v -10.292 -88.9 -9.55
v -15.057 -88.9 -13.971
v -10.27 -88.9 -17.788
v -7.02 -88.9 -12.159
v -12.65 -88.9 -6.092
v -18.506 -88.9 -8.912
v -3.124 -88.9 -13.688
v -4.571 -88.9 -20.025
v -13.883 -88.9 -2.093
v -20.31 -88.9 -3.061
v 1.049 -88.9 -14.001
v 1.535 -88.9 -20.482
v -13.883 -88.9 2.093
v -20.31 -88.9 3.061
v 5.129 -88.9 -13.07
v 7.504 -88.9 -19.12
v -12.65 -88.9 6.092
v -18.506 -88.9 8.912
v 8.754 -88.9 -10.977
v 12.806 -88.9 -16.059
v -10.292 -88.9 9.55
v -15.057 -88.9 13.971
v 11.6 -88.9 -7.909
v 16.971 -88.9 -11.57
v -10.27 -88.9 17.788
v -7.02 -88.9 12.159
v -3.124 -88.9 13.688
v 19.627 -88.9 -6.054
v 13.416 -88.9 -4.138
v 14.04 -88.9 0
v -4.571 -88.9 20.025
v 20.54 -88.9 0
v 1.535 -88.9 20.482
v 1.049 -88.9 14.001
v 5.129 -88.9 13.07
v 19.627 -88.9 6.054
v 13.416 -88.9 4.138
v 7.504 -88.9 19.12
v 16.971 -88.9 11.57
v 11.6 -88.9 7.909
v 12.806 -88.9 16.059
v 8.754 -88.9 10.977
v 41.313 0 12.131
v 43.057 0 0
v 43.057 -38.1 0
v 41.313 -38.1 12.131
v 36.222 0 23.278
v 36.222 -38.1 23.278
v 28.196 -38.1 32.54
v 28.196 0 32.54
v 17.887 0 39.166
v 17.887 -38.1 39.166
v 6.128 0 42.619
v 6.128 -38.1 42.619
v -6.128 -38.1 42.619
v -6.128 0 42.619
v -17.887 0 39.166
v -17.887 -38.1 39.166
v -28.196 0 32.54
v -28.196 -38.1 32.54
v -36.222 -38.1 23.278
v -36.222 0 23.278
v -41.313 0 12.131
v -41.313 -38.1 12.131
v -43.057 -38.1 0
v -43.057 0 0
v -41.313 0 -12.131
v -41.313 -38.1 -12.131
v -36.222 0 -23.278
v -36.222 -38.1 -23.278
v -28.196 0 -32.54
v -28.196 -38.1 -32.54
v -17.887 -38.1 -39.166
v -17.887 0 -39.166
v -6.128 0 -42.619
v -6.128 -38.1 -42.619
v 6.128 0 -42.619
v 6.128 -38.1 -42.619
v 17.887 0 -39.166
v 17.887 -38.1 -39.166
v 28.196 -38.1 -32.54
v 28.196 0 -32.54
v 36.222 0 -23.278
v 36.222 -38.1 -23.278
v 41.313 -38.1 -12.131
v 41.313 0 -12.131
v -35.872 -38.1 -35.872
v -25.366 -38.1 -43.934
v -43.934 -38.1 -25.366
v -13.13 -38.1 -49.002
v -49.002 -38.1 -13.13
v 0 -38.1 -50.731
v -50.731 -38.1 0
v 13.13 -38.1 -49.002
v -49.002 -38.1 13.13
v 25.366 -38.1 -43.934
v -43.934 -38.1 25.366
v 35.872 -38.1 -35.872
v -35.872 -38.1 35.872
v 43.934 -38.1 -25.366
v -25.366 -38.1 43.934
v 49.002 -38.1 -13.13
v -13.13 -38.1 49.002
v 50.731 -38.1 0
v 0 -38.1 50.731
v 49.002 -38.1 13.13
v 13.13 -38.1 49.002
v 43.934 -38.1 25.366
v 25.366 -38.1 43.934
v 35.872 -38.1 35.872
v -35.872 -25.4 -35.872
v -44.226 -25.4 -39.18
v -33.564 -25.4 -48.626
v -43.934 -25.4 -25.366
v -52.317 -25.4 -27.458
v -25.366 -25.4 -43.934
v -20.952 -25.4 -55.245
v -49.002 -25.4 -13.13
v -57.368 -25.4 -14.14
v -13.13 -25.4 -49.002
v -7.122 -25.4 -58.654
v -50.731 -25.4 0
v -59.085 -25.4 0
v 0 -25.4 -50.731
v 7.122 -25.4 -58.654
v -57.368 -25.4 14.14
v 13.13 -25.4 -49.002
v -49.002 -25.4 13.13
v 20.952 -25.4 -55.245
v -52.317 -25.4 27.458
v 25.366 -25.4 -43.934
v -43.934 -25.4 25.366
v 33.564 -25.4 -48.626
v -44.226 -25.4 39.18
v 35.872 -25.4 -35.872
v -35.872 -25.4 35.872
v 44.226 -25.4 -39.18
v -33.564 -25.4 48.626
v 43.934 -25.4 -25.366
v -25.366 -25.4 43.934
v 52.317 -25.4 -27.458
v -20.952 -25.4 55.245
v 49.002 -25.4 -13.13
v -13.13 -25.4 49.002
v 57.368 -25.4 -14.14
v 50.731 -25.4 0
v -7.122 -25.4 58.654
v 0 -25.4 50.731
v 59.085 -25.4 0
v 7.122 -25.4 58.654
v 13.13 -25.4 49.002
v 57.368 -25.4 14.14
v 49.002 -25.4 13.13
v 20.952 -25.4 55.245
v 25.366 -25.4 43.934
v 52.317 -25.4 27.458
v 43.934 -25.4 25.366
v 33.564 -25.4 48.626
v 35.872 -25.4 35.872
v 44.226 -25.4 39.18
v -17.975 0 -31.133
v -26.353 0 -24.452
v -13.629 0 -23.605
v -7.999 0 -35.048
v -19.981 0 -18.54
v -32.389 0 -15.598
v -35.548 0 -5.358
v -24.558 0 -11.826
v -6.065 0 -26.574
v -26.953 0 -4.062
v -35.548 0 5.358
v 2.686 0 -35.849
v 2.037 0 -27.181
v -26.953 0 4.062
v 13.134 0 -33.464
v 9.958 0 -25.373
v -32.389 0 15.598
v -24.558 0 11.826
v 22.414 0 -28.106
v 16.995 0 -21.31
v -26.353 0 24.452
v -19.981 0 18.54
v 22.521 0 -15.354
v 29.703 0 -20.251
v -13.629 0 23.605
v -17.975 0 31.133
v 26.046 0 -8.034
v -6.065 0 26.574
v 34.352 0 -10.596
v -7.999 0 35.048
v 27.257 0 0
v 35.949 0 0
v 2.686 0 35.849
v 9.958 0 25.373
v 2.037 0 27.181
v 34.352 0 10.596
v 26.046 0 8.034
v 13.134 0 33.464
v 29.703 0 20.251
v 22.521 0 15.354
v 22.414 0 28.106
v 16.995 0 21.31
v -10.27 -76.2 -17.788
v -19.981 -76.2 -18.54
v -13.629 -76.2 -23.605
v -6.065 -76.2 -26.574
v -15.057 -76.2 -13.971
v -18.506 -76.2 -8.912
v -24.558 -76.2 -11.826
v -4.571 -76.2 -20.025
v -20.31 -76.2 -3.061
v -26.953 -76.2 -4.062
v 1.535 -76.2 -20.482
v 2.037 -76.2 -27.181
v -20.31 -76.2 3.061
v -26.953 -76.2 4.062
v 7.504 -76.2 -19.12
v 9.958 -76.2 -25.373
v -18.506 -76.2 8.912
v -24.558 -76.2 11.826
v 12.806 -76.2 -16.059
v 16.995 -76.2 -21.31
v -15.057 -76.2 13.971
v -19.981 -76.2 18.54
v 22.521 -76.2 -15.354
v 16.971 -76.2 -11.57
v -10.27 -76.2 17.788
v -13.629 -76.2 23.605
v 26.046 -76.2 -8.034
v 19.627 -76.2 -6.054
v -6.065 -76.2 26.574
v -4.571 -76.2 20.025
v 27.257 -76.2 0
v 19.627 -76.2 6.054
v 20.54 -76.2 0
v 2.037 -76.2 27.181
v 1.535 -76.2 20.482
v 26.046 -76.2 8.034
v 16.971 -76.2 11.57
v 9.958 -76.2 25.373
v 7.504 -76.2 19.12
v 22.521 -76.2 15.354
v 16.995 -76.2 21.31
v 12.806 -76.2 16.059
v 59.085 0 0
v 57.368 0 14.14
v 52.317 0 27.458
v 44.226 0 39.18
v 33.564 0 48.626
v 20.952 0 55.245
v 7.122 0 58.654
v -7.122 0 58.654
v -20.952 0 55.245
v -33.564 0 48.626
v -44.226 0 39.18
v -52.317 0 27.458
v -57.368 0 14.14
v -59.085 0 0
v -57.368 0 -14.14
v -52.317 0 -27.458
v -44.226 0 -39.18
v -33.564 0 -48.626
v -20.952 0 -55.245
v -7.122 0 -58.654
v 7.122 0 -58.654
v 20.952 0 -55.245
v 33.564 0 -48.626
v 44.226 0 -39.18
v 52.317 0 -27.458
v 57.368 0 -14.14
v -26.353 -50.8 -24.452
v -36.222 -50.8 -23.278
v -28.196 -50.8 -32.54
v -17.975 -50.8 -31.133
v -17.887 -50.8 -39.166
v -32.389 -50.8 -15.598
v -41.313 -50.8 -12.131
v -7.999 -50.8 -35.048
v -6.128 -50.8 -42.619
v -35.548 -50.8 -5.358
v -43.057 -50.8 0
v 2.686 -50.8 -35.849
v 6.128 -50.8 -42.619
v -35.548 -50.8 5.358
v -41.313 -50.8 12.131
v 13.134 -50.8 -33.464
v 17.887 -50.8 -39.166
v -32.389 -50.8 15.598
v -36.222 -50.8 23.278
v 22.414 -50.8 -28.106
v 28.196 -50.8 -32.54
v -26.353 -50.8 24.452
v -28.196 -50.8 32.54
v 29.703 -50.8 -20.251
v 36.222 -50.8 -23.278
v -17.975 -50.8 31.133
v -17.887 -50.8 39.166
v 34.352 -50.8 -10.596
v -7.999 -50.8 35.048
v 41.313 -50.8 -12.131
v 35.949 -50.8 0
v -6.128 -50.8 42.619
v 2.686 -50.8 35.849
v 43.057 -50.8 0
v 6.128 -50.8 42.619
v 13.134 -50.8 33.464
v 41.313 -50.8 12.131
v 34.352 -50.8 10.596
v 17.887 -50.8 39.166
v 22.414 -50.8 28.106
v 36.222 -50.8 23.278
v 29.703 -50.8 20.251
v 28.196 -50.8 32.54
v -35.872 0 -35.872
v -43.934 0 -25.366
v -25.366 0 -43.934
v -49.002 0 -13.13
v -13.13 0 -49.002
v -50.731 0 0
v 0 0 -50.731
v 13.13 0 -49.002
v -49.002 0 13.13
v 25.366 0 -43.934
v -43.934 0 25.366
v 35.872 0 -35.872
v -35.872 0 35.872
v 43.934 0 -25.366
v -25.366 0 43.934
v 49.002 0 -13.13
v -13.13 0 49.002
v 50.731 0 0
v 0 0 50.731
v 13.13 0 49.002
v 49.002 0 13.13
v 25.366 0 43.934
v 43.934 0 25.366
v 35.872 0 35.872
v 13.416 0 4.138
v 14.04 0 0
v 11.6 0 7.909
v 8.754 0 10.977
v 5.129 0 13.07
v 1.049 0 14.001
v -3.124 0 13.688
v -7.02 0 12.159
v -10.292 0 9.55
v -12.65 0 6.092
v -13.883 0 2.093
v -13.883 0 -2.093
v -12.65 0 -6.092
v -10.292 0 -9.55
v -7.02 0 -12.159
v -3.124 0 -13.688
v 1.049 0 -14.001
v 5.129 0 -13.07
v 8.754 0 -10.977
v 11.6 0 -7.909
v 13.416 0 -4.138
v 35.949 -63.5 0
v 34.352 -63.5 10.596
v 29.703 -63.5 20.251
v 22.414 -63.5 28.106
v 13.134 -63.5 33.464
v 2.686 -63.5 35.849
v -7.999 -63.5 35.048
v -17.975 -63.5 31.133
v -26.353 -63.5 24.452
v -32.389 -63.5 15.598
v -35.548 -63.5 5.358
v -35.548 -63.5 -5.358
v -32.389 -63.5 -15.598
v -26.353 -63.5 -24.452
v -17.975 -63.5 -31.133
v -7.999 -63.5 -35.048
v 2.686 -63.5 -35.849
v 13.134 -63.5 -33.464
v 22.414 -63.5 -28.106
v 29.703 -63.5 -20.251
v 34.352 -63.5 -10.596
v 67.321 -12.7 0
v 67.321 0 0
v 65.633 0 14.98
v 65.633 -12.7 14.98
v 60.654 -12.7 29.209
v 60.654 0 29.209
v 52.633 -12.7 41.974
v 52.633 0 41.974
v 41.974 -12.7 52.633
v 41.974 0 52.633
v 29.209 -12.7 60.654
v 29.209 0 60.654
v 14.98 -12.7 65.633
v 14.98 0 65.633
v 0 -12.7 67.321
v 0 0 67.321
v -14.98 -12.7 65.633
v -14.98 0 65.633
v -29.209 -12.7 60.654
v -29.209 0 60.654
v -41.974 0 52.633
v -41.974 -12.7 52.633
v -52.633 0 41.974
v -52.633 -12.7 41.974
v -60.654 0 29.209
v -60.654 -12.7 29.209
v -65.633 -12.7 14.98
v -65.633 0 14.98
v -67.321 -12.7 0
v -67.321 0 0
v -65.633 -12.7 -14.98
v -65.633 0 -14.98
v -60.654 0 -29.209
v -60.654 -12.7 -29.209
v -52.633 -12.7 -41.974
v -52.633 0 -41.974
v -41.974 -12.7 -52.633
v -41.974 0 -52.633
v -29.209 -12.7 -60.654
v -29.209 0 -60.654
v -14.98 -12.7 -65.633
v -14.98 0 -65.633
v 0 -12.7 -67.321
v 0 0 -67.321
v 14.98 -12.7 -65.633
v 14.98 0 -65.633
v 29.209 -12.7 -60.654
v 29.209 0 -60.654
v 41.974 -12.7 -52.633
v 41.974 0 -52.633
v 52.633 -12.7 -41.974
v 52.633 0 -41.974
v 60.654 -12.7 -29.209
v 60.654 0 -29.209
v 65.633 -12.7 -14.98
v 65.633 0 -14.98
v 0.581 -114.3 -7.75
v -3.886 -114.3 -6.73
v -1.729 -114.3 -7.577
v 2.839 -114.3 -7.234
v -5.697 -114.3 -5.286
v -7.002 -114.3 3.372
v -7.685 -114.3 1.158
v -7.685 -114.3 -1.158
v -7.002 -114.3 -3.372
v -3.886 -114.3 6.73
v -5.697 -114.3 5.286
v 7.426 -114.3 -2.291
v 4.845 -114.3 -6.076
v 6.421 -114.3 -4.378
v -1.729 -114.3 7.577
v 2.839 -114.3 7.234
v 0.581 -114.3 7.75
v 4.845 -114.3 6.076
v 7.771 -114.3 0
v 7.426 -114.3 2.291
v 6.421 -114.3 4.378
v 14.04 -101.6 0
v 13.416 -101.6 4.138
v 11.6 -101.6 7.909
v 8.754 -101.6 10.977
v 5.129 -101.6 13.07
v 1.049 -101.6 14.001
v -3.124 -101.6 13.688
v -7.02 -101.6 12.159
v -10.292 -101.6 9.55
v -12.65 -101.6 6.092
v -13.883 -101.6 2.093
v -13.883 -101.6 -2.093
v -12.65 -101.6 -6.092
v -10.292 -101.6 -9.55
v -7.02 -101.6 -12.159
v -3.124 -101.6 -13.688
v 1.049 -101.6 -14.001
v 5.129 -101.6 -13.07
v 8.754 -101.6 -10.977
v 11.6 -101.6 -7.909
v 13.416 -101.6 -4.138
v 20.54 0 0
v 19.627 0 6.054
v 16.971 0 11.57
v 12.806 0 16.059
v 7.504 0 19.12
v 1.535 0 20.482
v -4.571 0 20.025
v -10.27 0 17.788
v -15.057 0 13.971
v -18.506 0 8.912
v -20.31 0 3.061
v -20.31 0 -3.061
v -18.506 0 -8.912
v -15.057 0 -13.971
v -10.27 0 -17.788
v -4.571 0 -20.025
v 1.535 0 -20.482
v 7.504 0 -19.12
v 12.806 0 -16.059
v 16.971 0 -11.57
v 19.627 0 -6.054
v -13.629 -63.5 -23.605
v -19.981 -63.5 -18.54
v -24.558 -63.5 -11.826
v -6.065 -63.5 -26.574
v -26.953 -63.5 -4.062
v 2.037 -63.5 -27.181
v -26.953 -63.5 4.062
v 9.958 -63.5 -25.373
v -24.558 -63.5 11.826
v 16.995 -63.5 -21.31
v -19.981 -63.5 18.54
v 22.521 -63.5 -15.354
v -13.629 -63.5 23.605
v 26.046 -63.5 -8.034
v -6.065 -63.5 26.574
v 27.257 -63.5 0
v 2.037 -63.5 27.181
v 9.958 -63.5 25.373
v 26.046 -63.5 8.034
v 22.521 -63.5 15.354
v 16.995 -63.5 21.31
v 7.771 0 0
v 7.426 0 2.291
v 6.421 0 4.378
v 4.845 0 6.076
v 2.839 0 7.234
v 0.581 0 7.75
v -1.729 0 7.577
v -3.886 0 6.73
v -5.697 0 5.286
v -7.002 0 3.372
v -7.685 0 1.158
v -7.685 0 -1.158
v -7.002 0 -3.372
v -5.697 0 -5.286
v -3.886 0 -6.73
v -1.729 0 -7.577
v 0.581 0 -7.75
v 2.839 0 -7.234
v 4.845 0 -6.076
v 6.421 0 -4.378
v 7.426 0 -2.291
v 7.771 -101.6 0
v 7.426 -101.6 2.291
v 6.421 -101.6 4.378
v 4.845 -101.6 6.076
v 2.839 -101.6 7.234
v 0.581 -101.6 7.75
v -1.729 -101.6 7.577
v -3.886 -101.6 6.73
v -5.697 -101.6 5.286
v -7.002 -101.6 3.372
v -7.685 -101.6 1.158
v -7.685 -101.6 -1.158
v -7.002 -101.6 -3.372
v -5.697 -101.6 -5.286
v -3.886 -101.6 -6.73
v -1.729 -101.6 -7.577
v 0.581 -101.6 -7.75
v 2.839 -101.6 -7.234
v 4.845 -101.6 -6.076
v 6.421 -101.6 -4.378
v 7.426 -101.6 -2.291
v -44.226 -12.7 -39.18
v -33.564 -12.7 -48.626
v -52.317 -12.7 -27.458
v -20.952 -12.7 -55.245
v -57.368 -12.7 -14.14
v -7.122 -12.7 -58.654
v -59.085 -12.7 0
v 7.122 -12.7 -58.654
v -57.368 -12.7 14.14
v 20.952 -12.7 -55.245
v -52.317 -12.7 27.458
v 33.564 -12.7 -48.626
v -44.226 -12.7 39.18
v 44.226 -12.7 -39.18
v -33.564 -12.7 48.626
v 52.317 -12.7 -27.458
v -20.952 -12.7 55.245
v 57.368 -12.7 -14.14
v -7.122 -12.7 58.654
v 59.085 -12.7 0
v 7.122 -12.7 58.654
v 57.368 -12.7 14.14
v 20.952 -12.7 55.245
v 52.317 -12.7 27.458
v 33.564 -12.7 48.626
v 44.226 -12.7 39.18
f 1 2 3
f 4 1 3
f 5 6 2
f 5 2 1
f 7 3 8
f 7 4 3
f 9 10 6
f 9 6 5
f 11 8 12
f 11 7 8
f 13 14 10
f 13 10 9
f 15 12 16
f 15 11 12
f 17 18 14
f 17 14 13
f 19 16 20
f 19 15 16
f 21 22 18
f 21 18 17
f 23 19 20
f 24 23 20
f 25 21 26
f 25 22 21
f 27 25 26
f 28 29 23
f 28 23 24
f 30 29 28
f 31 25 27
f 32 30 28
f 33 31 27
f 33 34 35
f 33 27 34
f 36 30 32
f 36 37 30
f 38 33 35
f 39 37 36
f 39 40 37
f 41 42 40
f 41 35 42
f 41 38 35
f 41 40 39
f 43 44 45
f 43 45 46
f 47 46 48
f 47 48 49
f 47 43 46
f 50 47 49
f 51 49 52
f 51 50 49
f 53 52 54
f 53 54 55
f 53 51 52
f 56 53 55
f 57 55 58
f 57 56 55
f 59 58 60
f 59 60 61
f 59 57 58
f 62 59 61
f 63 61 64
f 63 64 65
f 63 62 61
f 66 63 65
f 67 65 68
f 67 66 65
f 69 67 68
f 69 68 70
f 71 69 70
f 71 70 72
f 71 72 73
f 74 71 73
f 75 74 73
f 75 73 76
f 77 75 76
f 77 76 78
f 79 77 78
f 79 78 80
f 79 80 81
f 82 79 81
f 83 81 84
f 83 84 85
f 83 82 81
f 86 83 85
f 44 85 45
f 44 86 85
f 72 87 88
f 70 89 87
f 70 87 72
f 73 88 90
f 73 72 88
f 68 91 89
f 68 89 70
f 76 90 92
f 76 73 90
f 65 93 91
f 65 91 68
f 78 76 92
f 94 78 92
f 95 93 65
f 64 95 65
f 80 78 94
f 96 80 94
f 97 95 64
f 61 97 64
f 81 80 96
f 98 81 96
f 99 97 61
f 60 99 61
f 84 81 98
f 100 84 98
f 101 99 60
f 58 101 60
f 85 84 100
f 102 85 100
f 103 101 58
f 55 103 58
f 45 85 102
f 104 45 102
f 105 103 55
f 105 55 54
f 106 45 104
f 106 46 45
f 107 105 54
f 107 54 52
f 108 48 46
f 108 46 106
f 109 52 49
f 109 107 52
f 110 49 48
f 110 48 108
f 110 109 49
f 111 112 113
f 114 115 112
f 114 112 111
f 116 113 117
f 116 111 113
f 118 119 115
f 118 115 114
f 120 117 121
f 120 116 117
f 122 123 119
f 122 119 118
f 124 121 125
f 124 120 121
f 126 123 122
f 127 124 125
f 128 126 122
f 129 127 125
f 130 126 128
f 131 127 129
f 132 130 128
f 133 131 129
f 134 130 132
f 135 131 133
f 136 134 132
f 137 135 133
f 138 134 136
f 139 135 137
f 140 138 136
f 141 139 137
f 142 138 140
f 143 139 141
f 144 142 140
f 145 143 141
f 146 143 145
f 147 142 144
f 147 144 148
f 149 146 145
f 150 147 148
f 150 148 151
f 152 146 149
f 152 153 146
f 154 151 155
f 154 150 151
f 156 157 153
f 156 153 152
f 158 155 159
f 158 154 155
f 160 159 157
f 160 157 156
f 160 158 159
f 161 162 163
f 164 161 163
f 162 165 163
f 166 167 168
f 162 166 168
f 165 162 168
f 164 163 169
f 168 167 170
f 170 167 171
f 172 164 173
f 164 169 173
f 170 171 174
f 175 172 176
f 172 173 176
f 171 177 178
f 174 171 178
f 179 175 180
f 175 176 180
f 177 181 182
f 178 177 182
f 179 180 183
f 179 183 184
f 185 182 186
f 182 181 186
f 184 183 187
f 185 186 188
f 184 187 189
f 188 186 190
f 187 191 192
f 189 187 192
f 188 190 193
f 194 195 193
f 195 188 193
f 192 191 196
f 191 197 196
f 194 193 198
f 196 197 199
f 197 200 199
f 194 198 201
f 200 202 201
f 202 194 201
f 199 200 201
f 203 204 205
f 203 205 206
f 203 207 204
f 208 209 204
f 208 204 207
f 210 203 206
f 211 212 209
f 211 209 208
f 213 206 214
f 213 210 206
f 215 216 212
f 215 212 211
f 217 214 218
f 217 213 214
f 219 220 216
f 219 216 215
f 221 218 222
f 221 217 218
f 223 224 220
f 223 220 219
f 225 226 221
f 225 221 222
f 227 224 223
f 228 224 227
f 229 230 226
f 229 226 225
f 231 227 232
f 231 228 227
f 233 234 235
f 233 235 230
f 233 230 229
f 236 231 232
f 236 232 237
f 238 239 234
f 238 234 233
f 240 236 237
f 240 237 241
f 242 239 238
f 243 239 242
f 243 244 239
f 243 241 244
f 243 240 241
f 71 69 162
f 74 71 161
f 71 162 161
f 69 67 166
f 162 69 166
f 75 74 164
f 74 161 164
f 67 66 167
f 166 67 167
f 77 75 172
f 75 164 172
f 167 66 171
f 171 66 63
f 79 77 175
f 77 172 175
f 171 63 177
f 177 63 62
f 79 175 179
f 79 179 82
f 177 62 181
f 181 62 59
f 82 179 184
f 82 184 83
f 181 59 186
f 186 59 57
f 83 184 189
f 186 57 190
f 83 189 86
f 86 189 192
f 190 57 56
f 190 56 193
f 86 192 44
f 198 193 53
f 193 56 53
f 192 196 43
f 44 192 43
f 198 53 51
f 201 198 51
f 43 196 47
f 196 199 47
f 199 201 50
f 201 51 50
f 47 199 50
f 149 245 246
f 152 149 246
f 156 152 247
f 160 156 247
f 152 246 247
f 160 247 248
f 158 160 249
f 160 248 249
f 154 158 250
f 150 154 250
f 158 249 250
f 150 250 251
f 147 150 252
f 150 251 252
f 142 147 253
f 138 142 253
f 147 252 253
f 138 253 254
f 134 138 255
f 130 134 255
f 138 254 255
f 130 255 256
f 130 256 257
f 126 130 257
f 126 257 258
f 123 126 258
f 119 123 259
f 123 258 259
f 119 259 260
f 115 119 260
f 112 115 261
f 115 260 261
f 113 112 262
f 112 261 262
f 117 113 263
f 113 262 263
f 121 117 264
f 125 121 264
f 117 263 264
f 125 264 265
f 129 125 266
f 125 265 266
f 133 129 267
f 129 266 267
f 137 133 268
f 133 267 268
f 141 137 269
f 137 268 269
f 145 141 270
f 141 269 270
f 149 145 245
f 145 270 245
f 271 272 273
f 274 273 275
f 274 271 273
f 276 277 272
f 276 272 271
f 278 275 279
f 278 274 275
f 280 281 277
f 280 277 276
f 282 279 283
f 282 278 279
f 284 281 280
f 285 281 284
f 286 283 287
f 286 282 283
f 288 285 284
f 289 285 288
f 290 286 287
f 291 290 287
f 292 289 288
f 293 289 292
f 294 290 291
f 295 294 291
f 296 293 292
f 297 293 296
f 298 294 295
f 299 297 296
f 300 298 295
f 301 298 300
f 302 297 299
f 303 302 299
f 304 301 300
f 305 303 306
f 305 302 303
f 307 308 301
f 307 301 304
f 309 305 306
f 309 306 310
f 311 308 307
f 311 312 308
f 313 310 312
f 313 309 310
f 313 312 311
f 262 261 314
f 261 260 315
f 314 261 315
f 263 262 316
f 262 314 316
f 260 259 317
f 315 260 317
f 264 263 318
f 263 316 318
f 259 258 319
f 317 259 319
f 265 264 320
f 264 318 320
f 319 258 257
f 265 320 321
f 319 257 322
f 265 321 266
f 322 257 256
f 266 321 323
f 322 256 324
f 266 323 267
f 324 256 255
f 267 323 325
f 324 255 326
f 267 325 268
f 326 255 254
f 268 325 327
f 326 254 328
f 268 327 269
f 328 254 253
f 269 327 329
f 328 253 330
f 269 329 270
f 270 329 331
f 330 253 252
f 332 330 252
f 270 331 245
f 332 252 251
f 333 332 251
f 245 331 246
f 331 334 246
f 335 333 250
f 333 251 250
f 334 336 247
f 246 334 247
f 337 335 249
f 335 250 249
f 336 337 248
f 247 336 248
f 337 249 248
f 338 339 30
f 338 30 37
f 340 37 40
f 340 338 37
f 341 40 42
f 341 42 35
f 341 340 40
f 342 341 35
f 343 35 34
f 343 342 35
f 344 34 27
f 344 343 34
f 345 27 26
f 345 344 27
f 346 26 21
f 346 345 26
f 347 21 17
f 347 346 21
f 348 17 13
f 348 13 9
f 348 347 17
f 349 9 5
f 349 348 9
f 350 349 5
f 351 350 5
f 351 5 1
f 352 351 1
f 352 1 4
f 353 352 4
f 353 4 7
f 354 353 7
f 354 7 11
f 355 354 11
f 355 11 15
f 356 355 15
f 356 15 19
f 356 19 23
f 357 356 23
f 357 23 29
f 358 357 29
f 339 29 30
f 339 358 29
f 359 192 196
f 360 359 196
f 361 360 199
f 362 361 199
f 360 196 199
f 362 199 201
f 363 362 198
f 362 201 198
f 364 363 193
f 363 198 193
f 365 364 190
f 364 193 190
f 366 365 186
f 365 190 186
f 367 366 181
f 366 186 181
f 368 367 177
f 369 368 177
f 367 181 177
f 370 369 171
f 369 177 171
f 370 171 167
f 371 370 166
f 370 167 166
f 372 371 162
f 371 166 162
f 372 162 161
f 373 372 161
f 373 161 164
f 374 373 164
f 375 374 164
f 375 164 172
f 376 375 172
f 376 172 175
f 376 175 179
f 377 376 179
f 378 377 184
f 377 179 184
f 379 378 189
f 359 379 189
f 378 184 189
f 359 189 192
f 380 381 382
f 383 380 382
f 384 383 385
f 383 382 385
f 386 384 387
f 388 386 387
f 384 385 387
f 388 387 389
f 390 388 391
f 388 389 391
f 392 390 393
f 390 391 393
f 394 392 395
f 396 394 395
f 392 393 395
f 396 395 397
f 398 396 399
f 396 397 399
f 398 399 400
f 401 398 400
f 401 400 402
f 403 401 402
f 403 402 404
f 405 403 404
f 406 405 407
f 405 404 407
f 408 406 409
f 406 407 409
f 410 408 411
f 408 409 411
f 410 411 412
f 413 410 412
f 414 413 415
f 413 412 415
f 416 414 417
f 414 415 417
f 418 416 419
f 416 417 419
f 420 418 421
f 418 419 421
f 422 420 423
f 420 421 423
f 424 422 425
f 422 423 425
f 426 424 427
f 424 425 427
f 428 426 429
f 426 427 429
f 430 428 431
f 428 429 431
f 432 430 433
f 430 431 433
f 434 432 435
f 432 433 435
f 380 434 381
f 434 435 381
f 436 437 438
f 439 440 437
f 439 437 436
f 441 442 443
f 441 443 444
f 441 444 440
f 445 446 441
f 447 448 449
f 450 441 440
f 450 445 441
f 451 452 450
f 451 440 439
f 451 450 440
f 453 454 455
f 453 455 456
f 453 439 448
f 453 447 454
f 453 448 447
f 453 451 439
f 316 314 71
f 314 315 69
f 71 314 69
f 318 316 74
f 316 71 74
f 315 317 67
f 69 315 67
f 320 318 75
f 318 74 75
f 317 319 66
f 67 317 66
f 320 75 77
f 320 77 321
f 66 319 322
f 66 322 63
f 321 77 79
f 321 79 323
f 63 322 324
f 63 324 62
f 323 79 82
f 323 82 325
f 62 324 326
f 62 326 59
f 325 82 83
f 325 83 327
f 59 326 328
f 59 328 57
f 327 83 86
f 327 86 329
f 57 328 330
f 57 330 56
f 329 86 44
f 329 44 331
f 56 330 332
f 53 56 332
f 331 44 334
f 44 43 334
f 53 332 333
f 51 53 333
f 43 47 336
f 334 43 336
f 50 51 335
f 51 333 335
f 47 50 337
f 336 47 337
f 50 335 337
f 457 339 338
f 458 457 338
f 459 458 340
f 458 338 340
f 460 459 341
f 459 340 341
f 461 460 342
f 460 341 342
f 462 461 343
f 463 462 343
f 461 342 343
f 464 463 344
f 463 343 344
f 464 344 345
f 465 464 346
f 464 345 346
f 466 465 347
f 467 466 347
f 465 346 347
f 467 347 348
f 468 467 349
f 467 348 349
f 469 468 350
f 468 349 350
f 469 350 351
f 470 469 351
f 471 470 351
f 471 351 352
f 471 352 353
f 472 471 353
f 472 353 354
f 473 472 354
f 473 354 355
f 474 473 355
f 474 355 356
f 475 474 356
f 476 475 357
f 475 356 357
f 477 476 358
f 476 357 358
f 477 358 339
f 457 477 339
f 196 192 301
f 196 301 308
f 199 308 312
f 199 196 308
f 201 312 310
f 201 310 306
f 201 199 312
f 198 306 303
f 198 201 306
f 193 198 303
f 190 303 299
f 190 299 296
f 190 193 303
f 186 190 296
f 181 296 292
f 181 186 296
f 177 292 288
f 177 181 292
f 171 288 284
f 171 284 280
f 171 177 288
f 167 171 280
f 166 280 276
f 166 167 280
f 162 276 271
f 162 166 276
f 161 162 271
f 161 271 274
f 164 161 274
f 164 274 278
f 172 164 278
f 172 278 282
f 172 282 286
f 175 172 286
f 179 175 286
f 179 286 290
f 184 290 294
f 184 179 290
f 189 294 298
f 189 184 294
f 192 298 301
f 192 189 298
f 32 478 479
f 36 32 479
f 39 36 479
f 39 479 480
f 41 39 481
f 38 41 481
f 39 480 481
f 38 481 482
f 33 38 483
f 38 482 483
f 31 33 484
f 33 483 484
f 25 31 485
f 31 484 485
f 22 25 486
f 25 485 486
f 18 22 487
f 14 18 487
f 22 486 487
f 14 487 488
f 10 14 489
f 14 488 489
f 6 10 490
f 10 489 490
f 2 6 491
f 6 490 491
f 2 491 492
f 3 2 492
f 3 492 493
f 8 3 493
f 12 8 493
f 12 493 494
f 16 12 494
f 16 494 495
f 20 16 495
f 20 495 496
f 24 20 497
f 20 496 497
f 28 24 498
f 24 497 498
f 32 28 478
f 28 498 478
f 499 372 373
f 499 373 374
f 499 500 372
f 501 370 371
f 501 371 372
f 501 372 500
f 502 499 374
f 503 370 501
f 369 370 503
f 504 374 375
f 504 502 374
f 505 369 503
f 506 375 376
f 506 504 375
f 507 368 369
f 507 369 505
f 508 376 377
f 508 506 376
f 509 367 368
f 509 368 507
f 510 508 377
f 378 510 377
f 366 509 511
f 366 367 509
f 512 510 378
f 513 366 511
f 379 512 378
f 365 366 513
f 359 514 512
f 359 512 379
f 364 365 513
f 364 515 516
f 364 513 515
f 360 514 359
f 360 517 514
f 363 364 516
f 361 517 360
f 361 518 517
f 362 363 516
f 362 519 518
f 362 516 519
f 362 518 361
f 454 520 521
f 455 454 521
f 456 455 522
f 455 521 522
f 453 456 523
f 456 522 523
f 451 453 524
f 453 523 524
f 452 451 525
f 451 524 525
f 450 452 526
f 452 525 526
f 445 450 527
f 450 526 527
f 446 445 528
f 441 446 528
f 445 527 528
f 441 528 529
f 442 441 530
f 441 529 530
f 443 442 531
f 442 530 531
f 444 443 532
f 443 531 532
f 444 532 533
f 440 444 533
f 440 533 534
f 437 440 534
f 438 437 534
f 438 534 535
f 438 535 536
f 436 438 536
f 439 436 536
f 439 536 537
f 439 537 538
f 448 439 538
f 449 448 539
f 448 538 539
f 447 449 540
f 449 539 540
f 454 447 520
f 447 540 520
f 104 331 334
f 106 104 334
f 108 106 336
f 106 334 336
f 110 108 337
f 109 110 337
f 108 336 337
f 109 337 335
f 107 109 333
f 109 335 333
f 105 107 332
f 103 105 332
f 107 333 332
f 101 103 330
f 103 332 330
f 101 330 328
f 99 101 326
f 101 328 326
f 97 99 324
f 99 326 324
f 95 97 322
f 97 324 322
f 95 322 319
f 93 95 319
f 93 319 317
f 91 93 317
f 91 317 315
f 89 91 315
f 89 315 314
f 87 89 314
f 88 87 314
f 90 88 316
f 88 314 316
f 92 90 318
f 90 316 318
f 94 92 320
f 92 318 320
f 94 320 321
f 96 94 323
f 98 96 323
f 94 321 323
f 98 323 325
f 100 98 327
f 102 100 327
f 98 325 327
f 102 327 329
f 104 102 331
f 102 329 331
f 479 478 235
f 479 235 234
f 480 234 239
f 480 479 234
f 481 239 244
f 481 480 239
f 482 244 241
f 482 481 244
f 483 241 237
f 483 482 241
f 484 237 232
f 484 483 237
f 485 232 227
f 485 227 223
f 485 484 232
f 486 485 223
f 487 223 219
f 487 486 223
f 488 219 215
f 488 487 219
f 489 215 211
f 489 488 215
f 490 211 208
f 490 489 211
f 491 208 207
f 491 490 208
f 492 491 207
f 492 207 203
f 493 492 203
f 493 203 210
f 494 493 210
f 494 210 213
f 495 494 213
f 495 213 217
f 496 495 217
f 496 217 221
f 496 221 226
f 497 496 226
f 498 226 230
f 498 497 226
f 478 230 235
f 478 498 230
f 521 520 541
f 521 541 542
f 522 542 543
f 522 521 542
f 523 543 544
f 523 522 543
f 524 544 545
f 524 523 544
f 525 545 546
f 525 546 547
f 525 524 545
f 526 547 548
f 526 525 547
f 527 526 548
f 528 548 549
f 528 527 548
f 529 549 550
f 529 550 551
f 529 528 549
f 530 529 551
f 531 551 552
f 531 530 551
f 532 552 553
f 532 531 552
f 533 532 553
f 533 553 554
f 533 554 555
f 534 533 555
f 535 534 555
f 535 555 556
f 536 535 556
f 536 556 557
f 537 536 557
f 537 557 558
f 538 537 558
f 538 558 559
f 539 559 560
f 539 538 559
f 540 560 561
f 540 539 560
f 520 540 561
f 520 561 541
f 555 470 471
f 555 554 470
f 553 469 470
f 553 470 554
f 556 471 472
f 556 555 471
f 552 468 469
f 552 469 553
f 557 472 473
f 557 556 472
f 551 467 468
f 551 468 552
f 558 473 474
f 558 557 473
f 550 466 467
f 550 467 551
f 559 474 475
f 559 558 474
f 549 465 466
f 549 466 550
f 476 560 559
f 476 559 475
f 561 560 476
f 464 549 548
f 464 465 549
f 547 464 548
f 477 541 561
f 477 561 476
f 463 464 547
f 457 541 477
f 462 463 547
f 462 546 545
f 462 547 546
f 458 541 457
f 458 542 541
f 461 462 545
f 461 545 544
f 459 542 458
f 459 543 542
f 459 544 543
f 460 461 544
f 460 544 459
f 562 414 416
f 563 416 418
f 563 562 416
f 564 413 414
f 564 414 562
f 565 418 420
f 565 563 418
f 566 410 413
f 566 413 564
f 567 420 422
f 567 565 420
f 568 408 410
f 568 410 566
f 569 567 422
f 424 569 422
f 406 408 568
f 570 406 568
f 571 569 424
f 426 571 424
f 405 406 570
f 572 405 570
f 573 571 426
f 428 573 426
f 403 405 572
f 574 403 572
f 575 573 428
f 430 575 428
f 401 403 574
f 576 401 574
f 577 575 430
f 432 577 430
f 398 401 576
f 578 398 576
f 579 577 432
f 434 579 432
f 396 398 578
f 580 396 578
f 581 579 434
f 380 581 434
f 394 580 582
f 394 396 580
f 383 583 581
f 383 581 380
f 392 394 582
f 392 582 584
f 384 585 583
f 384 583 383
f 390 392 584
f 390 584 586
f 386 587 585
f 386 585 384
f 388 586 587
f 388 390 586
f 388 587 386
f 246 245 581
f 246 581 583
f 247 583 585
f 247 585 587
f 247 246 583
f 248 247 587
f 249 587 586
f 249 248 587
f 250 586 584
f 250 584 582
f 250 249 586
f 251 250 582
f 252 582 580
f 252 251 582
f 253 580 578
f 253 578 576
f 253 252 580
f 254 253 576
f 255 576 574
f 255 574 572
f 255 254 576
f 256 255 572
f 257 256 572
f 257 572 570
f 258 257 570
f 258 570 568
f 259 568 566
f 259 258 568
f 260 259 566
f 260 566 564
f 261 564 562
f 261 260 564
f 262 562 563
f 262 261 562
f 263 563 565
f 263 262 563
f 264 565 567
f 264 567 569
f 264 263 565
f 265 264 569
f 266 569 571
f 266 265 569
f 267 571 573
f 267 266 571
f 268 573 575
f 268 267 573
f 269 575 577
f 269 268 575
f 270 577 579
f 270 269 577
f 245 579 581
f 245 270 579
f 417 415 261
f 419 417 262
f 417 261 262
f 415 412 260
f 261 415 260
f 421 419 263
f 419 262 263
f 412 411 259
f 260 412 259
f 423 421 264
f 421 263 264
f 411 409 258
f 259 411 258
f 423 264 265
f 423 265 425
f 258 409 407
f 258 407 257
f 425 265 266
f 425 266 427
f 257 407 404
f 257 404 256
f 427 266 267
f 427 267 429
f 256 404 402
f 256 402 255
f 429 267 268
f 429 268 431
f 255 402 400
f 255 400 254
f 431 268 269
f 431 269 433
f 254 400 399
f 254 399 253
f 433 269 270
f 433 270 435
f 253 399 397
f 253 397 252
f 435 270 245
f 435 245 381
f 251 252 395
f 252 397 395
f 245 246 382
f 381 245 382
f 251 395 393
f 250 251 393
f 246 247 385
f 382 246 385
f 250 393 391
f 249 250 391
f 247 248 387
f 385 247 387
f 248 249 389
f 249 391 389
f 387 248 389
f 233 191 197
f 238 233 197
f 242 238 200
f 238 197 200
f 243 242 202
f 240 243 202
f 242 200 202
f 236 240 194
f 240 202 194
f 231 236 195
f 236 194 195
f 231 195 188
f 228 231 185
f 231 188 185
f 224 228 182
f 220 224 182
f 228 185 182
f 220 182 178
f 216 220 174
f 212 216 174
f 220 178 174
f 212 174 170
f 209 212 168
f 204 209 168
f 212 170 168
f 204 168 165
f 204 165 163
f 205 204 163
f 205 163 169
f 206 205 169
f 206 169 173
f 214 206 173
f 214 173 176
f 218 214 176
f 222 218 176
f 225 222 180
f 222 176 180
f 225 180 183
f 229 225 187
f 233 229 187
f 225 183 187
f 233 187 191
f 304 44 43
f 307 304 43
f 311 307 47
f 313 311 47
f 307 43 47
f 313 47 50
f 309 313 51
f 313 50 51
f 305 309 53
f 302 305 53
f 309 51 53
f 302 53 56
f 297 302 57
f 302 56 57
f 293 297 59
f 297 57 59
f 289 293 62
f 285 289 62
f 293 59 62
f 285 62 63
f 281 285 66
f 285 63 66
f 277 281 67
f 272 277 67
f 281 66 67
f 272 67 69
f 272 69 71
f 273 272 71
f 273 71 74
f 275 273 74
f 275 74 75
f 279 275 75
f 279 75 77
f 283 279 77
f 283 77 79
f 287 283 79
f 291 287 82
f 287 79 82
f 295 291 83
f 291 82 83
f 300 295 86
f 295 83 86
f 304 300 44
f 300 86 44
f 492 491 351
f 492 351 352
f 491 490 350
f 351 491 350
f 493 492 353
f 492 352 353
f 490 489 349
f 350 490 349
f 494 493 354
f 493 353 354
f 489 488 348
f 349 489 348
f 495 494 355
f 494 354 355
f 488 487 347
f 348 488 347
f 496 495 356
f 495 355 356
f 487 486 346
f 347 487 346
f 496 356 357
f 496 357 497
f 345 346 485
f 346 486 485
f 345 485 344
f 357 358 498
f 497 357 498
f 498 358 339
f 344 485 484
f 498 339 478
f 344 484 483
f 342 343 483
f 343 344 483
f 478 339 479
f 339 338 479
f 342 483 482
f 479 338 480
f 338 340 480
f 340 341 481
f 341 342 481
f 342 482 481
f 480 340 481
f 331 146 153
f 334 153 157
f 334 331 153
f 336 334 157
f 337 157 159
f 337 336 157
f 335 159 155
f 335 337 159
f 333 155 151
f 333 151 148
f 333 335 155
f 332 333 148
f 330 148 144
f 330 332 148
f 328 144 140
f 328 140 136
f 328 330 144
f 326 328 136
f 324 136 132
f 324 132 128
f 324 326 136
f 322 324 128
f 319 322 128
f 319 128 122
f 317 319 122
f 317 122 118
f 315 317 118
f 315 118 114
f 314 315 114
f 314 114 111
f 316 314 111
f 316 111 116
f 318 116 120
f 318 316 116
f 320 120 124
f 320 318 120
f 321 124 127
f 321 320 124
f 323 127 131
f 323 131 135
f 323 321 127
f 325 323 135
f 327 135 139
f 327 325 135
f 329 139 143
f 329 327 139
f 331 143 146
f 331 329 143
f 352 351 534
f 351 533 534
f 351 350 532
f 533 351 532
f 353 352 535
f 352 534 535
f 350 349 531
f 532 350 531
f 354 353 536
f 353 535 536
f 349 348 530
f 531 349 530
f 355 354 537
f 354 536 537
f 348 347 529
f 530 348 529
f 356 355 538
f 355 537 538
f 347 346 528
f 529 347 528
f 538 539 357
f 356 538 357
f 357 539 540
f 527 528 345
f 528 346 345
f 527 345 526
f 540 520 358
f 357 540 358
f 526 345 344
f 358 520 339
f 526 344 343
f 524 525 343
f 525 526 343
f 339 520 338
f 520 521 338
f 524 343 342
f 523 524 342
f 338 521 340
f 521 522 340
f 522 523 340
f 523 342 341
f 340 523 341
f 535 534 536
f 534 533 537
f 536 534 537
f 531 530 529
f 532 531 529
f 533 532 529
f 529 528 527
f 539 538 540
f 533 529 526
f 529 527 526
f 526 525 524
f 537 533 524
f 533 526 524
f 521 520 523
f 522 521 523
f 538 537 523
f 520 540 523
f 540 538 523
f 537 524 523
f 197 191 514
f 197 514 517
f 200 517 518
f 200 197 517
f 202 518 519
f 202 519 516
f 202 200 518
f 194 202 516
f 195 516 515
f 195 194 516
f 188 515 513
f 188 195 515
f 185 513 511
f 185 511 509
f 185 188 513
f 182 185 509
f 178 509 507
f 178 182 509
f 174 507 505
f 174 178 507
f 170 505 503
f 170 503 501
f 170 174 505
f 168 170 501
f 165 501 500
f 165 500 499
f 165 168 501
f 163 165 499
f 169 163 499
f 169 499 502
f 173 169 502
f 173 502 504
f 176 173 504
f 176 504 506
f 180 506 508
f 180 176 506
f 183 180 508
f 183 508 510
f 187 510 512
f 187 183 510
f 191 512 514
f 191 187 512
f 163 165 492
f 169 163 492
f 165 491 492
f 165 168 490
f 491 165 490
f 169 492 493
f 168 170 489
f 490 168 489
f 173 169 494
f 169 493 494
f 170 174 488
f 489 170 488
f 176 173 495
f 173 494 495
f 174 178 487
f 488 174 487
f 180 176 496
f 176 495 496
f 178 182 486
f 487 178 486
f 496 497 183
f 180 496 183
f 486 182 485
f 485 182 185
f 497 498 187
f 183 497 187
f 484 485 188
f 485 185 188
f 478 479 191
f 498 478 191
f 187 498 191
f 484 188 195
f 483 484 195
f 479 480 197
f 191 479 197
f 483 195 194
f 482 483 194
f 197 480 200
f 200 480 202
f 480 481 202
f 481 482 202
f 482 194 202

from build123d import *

# Parameters (mm, degrees)
F0_R     = 67.320572
F0_R_2   = 59.084794
F1_DEPTH = 12.7
F0_R_3   = 50.731089
F2_DEPTH = 25.4
F0_R_4   = 43.057022
F3_DEPTH = 38.1
F0_R_5   = 35.949193
F4_DEPTH = 50.8
F0_R_6   = 27.257099
F5_DEPTH = 63.5
F0_R_7   = 20.539643
F6_DEPTH = 76.2
F0_R_8   = 14.040046
F7_DEPTH = 88.9
F0_R_9   = 7.771382
F8_DEPTH = 101.6
F9_DEPTH = 114.3


with BuildPart() as f1:
    # F0 (on Front) → F1 (new body)
    with BuildSketch(Plane.XZ):
        Circle(F0_R)
        Circle(F0_R_2, mode=Mode.SUBTRACT)
    extrude(amount=F1_DEPTH)


with BuildPart() as f2:
    # F0 (on Front) → F2 (new body)
    with BuildSketch(Plane.XZ):
        Circle(F0_R_2)
        Circle(F0_R_3, mode=Mode.SUBTRACT)
    extrude(amount=F2_DEPTH)


with BuildPart() as f3:
    # F0 (on Front) → F3 (new body)
    with BuildSketch(Plane.XZ):
        Circle(F0_R_3)
        Circle(F0_R_4, mode=Mode.SUBTRACT)
    extrude(amount=F3_DEPTH)


with BuildPart() as f4:
    # F0 (on Front) → F4 (new body)
    with BuildSketch(Plane.XZ):
        Circle(F0_R_4)
        Circle(F0_R_5, mode=Mode.SUBTRACT)
    extrude(amount=F4_DEPTH)


with BuildPart() as f5:
    # F0 (on Front) → F5 (new body)
    with BuildSketch(Plane.XZ):
        Circle(F0_R_5)
        Circle(F0_R_6, mode=Mode.SUBTRACT)
    extrude(amount=F5_DEPTH)


with BuildPart() as f6:
    # F0 (on Front) → F6 (new body)
    with BuildSketch(Plane.XZ):
        Circle(F0_R_6)
        Circle(F0_R_7, mode=Mode.SUBTRACT)
    extrude(amount=F6_DEPTH)


with BuildPart() as f7:
    # F0 (on Front) → F7 (new body)
    with BuildSketch(Plane.XZ):
        Circle(F0_R_7)
        Circle(F0_R_8, mode=Mode.SUBTRACT)
    extrude(amount=F7_DEPTH)


with BuildPart() as f8:
    # F0 (on Front) → F8 (new body)
    with BuildSketch(Plane.XZ):
        Circle(F0_R_8)
        Circle(F0_R_9, mode=Mode.SUBTRACT)
    extrude(amount=F8_DEPTH)


with BuildPart() as f9:
    # F0 (on Front) → F9 (new body)
    with BuildSketch(Plane.XZ):
        Circle(F0_R_9)
    extrude(amount=F9_DEPTH)


solid = Compound([f1.part, f2.part, f3.part, f4.part, f5.part, f6.part, f7.part, f8.part, f9.part])
